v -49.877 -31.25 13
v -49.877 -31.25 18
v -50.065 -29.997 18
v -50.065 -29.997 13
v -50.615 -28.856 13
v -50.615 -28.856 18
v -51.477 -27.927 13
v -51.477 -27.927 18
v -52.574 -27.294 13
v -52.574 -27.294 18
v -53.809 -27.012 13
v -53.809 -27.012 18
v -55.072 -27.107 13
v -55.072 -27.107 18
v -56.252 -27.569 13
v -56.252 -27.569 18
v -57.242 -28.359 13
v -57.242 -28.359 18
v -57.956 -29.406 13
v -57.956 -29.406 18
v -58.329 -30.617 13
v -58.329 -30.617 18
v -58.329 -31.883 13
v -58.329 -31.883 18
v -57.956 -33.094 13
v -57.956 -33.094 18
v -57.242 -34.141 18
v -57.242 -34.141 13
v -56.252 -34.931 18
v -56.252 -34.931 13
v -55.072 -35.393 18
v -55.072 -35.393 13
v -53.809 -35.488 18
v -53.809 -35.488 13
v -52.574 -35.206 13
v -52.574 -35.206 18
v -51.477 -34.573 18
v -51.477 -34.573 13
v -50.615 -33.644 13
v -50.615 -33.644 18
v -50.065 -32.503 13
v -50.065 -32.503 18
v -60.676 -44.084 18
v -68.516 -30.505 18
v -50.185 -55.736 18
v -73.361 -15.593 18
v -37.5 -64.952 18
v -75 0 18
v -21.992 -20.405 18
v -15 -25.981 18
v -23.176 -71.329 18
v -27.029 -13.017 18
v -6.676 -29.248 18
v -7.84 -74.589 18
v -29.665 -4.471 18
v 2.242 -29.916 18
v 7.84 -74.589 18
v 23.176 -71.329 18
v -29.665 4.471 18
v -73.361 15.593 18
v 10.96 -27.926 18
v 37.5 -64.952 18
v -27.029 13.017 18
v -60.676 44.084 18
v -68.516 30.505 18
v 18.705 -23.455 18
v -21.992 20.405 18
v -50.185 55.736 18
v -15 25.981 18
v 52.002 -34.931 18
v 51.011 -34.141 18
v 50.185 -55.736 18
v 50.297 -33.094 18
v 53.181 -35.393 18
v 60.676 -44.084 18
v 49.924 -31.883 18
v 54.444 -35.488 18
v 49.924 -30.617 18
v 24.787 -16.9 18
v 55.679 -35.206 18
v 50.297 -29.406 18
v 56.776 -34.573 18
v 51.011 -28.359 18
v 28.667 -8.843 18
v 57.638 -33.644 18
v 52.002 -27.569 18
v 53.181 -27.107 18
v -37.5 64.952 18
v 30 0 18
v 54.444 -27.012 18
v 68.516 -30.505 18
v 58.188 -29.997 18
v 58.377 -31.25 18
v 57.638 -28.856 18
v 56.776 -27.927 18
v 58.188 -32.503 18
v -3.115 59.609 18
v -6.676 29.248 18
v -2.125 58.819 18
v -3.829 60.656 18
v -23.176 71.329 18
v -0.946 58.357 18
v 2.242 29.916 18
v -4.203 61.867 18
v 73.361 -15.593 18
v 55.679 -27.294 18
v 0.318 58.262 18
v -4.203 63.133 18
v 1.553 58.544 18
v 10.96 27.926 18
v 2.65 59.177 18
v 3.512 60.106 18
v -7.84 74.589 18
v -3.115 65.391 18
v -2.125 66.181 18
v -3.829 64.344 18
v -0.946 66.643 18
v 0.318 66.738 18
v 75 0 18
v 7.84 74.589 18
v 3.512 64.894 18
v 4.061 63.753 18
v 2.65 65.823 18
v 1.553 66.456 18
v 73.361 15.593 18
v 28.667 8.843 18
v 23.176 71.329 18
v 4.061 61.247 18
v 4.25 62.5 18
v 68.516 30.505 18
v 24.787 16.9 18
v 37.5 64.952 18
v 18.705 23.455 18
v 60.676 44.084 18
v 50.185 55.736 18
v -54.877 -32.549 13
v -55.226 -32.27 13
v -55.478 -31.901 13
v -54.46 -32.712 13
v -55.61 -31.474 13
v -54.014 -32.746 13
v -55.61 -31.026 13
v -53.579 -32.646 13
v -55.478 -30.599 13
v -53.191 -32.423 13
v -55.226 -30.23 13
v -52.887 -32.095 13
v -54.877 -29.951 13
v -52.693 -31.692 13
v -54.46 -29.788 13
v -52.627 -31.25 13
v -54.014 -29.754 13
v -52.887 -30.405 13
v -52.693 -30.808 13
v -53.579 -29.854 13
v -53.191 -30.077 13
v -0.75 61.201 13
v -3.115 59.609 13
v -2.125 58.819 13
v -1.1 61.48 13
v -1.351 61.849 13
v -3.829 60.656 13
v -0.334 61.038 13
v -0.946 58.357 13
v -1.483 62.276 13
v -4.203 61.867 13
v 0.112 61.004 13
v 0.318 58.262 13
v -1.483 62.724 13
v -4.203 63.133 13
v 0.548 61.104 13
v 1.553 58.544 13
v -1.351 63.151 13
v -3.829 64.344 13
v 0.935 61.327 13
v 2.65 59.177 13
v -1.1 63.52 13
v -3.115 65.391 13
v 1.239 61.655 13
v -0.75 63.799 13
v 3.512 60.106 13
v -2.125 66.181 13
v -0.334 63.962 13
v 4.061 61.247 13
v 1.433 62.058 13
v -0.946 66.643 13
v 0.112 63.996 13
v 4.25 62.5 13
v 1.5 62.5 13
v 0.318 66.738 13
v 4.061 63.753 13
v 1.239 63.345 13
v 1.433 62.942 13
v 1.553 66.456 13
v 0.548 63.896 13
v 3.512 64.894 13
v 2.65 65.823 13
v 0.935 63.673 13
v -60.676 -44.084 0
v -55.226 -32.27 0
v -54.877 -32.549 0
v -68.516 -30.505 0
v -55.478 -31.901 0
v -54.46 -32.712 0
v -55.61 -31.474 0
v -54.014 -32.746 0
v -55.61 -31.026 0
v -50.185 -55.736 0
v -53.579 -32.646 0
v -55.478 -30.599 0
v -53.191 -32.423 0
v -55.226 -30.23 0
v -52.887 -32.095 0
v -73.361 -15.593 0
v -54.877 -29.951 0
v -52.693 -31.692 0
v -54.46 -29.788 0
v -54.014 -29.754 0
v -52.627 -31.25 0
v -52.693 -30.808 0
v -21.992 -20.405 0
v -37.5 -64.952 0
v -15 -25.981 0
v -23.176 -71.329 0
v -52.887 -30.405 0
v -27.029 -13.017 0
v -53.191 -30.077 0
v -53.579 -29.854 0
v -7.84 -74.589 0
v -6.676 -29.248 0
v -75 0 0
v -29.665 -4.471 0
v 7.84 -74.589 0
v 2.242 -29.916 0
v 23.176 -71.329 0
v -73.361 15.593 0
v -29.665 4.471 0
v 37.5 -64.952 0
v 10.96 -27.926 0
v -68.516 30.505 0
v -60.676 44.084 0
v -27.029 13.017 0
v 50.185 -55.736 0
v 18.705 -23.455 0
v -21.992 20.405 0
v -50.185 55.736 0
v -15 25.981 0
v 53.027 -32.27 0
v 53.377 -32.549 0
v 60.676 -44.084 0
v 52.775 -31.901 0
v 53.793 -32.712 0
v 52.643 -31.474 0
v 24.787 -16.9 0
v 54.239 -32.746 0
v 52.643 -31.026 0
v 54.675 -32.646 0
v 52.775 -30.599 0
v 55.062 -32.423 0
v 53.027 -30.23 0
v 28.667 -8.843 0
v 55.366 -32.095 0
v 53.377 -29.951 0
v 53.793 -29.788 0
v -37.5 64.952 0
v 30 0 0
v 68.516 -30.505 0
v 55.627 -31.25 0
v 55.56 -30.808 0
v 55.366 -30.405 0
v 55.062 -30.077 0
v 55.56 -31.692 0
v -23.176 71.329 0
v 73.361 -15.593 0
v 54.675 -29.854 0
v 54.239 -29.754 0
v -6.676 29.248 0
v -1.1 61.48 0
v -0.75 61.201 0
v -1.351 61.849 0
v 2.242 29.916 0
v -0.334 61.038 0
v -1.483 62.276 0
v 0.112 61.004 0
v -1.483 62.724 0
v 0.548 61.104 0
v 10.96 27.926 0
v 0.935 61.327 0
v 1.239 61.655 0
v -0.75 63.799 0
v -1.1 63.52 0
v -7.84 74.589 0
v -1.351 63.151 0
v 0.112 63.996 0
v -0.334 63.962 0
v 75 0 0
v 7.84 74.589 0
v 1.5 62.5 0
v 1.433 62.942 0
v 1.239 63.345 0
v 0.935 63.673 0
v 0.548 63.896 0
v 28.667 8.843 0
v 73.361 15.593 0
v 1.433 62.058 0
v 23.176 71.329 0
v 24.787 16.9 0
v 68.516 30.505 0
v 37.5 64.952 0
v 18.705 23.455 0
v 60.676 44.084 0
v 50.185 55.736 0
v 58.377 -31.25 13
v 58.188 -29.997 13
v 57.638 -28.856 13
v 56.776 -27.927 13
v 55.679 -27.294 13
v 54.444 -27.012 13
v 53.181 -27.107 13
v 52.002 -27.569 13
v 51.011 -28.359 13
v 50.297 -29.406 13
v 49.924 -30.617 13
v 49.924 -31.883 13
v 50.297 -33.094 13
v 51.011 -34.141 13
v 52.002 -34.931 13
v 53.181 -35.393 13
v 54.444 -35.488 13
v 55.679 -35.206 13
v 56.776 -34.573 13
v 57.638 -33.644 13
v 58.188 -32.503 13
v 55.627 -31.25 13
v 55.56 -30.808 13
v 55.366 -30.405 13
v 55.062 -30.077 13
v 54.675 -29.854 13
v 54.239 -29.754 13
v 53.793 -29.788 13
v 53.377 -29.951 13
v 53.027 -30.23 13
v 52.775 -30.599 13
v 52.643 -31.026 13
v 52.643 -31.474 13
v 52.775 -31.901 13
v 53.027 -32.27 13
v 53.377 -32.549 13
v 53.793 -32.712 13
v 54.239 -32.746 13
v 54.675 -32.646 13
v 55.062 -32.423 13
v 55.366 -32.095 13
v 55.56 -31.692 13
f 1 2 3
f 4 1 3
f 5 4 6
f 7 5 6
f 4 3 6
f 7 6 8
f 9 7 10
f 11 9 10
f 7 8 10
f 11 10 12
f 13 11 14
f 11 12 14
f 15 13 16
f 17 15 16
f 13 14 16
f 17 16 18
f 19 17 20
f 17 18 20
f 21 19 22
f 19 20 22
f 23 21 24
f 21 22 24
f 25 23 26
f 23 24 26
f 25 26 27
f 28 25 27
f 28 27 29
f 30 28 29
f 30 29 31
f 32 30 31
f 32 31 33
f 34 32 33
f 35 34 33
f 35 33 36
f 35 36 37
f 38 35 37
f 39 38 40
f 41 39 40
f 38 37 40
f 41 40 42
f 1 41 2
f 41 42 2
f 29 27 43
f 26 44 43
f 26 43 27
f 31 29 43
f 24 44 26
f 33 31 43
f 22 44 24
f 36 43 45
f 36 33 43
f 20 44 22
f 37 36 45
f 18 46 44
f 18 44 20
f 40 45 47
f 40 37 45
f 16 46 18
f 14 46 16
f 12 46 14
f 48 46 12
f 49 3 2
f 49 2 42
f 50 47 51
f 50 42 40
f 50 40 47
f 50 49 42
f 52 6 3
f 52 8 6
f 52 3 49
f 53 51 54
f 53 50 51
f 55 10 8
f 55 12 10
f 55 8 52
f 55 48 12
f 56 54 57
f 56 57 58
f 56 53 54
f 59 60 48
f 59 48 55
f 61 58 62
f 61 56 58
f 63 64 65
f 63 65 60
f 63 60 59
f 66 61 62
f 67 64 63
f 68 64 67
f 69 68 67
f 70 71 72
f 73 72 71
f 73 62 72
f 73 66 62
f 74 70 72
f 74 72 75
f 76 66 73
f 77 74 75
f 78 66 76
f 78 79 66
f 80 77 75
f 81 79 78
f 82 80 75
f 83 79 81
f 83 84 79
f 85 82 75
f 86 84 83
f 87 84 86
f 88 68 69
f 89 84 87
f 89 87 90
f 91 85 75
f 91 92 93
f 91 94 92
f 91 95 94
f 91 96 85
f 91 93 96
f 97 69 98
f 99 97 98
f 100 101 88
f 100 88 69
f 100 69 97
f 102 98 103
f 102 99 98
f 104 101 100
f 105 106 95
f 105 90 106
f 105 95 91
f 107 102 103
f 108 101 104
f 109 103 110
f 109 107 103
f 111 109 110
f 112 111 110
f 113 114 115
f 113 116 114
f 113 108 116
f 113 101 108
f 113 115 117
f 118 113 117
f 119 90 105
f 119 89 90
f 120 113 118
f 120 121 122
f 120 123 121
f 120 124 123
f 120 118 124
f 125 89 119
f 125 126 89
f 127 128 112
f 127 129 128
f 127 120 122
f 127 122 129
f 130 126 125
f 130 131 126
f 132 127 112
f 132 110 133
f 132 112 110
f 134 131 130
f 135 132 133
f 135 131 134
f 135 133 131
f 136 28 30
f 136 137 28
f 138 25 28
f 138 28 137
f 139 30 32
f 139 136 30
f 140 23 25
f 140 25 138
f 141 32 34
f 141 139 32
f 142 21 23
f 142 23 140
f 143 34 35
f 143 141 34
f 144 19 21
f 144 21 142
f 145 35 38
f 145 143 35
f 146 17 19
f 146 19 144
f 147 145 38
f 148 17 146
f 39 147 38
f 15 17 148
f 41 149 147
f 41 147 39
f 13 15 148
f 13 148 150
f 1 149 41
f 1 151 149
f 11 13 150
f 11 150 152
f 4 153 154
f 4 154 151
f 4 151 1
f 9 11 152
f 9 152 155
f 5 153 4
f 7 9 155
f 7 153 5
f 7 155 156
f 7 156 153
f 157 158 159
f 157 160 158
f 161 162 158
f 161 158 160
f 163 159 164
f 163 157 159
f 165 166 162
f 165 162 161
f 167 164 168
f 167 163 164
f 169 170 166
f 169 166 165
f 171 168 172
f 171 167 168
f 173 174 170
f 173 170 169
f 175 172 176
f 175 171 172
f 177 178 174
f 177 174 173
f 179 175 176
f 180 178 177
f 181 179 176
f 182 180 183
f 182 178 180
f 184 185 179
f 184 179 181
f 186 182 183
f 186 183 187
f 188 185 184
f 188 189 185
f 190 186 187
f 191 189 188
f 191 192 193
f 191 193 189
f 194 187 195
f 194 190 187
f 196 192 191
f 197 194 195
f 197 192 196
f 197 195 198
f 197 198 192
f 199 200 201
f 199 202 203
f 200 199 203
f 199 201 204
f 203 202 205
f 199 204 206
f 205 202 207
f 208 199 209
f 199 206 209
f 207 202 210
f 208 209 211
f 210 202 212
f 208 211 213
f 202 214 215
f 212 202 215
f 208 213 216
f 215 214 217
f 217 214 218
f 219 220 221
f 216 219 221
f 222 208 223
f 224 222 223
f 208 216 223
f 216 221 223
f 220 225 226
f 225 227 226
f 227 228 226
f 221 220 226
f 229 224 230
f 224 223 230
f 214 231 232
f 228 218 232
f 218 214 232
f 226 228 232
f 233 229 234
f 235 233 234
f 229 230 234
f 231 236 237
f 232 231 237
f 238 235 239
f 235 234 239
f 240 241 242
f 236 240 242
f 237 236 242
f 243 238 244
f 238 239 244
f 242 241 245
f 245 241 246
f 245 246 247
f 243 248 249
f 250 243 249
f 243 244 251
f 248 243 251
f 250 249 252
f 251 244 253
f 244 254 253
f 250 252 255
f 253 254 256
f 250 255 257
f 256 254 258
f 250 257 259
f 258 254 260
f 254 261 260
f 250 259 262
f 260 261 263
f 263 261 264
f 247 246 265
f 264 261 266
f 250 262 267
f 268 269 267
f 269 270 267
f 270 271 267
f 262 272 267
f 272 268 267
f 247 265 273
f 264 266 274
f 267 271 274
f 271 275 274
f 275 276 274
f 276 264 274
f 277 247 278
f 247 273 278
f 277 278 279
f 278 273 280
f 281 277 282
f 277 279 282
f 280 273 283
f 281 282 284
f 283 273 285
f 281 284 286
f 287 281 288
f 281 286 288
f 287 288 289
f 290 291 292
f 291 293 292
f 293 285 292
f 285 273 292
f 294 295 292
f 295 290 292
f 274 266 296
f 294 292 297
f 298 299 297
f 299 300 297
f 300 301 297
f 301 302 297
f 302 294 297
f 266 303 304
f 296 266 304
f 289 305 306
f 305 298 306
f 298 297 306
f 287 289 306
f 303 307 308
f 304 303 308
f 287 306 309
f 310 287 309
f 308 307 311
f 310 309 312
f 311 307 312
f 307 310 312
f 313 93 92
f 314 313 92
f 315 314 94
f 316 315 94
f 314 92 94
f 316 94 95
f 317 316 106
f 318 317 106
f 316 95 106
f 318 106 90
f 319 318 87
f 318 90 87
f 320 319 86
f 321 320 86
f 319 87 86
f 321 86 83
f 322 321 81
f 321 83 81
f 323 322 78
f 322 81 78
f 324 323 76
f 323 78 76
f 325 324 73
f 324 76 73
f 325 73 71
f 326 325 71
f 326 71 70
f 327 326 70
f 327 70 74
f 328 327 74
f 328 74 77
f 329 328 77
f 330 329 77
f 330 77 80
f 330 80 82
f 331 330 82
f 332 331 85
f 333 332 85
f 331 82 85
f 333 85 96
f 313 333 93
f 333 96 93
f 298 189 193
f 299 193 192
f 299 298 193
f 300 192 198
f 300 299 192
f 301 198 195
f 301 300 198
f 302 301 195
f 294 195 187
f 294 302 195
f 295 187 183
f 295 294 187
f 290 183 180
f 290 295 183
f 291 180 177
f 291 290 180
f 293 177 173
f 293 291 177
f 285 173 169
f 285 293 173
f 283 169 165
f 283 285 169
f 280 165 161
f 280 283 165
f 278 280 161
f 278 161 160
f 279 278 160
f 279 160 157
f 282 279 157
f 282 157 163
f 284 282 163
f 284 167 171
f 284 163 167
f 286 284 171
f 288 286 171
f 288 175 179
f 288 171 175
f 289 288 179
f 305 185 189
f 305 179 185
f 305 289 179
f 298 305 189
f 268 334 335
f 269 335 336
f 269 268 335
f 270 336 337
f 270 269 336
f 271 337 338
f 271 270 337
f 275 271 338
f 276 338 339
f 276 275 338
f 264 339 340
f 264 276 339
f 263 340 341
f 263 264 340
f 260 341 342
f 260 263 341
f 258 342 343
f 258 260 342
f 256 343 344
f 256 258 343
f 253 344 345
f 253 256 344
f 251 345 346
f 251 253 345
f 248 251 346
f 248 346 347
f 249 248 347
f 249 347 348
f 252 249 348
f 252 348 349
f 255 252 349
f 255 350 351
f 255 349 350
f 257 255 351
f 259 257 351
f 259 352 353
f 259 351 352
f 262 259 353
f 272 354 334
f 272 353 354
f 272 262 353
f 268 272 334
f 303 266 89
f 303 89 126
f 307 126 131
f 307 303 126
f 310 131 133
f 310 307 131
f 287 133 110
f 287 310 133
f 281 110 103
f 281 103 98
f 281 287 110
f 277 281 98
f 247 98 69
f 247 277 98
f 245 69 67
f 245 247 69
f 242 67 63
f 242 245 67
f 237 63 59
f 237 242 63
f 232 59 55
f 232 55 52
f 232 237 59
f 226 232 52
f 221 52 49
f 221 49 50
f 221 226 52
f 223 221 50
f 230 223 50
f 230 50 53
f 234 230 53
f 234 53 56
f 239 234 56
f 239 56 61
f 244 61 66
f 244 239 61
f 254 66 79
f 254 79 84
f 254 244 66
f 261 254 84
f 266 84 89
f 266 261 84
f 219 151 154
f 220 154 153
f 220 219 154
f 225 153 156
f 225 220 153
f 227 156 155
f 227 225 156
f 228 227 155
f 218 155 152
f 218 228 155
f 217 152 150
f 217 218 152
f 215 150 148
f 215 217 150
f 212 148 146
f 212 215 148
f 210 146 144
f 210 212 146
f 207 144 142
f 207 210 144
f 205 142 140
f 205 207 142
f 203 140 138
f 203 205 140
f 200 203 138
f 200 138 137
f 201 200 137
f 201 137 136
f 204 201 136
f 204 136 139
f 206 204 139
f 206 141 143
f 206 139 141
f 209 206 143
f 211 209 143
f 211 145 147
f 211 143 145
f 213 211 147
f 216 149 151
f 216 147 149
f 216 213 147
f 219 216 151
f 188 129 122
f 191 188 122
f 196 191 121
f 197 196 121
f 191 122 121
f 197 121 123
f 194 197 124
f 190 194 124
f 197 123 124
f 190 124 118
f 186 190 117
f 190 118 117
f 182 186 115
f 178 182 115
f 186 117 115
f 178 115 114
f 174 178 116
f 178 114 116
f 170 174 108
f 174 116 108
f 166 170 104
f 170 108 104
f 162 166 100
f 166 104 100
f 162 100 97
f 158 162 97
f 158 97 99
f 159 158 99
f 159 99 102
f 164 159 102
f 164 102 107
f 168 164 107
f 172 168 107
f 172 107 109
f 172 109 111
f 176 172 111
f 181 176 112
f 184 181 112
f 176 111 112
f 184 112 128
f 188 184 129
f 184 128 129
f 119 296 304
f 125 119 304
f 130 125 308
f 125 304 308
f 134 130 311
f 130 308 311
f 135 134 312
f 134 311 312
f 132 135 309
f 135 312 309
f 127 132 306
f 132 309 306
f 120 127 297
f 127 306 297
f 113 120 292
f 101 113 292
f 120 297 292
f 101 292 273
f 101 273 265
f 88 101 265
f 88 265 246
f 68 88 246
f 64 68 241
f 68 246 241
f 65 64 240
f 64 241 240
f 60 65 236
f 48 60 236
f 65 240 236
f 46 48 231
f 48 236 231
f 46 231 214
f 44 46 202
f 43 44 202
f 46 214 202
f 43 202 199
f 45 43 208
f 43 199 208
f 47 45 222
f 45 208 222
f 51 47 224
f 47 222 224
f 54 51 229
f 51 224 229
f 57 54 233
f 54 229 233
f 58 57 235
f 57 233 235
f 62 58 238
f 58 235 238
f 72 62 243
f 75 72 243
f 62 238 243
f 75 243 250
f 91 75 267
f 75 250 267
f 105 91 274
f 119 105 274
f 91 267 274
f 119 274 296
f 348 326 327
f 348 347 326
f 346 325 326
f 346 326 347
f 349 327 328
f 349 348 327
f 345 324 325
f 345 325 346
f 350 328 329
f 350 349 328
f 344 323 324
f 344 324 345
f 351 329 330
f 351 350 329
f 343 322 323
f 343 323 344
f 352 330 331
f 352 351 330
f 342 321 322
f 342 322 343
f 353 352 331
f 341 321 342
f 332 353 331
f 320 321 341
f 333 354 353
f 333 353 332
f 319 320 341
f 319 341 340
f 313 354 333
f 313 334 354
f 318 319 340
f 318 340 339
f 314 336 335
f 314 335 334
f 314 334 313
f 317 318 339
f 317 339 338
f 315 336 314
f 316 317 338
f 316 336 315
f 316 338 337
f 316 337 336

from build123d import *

# Parameters (mm, degrees)
F0_R     = 75
F0_R_2   = 1.5
F0_R_3   = 30
F1_DEPTH = 18
F2_R     = 4.25
F3_DEPTH = 5


with BuildPart() as f1:
    # F0 (on Top) → F1 (new body)
    with BuildSketch(Plane.XY):
        Circle(F0_R)
        with Locations((-54.126588, -31.25)):
            Circle(F0_R_2, mode=Mode.SUBTRACT)
        with Locations((54.126588, -31.25)):
            Circle(F0_R_2, mode=Mode.SUBTRACT)
        Circle(F0_R_3, mode=Mode.SUBTRACT)
        with Locations((0, 62.5)):
            Circle(F0_R_2, mode=Mode.SUBTRACT)
    extrude(amount=F1_DEPTH)

    # F2 (on face) → F3 (cut)
    with BuildSketch(Plane.XY.offset(18)):
        with Locations((-54.126588, -31.25)):
            Circle(F2_R)
        with Locations((54.126588, -31.25)):
            Circle(F2_R)
        with Locations((0, 62.5)):
            Circle(F2_R)
    extrude(amount=-F3_DEPTH, mode=Mode.SUBTRACT)


solid = f1.part
